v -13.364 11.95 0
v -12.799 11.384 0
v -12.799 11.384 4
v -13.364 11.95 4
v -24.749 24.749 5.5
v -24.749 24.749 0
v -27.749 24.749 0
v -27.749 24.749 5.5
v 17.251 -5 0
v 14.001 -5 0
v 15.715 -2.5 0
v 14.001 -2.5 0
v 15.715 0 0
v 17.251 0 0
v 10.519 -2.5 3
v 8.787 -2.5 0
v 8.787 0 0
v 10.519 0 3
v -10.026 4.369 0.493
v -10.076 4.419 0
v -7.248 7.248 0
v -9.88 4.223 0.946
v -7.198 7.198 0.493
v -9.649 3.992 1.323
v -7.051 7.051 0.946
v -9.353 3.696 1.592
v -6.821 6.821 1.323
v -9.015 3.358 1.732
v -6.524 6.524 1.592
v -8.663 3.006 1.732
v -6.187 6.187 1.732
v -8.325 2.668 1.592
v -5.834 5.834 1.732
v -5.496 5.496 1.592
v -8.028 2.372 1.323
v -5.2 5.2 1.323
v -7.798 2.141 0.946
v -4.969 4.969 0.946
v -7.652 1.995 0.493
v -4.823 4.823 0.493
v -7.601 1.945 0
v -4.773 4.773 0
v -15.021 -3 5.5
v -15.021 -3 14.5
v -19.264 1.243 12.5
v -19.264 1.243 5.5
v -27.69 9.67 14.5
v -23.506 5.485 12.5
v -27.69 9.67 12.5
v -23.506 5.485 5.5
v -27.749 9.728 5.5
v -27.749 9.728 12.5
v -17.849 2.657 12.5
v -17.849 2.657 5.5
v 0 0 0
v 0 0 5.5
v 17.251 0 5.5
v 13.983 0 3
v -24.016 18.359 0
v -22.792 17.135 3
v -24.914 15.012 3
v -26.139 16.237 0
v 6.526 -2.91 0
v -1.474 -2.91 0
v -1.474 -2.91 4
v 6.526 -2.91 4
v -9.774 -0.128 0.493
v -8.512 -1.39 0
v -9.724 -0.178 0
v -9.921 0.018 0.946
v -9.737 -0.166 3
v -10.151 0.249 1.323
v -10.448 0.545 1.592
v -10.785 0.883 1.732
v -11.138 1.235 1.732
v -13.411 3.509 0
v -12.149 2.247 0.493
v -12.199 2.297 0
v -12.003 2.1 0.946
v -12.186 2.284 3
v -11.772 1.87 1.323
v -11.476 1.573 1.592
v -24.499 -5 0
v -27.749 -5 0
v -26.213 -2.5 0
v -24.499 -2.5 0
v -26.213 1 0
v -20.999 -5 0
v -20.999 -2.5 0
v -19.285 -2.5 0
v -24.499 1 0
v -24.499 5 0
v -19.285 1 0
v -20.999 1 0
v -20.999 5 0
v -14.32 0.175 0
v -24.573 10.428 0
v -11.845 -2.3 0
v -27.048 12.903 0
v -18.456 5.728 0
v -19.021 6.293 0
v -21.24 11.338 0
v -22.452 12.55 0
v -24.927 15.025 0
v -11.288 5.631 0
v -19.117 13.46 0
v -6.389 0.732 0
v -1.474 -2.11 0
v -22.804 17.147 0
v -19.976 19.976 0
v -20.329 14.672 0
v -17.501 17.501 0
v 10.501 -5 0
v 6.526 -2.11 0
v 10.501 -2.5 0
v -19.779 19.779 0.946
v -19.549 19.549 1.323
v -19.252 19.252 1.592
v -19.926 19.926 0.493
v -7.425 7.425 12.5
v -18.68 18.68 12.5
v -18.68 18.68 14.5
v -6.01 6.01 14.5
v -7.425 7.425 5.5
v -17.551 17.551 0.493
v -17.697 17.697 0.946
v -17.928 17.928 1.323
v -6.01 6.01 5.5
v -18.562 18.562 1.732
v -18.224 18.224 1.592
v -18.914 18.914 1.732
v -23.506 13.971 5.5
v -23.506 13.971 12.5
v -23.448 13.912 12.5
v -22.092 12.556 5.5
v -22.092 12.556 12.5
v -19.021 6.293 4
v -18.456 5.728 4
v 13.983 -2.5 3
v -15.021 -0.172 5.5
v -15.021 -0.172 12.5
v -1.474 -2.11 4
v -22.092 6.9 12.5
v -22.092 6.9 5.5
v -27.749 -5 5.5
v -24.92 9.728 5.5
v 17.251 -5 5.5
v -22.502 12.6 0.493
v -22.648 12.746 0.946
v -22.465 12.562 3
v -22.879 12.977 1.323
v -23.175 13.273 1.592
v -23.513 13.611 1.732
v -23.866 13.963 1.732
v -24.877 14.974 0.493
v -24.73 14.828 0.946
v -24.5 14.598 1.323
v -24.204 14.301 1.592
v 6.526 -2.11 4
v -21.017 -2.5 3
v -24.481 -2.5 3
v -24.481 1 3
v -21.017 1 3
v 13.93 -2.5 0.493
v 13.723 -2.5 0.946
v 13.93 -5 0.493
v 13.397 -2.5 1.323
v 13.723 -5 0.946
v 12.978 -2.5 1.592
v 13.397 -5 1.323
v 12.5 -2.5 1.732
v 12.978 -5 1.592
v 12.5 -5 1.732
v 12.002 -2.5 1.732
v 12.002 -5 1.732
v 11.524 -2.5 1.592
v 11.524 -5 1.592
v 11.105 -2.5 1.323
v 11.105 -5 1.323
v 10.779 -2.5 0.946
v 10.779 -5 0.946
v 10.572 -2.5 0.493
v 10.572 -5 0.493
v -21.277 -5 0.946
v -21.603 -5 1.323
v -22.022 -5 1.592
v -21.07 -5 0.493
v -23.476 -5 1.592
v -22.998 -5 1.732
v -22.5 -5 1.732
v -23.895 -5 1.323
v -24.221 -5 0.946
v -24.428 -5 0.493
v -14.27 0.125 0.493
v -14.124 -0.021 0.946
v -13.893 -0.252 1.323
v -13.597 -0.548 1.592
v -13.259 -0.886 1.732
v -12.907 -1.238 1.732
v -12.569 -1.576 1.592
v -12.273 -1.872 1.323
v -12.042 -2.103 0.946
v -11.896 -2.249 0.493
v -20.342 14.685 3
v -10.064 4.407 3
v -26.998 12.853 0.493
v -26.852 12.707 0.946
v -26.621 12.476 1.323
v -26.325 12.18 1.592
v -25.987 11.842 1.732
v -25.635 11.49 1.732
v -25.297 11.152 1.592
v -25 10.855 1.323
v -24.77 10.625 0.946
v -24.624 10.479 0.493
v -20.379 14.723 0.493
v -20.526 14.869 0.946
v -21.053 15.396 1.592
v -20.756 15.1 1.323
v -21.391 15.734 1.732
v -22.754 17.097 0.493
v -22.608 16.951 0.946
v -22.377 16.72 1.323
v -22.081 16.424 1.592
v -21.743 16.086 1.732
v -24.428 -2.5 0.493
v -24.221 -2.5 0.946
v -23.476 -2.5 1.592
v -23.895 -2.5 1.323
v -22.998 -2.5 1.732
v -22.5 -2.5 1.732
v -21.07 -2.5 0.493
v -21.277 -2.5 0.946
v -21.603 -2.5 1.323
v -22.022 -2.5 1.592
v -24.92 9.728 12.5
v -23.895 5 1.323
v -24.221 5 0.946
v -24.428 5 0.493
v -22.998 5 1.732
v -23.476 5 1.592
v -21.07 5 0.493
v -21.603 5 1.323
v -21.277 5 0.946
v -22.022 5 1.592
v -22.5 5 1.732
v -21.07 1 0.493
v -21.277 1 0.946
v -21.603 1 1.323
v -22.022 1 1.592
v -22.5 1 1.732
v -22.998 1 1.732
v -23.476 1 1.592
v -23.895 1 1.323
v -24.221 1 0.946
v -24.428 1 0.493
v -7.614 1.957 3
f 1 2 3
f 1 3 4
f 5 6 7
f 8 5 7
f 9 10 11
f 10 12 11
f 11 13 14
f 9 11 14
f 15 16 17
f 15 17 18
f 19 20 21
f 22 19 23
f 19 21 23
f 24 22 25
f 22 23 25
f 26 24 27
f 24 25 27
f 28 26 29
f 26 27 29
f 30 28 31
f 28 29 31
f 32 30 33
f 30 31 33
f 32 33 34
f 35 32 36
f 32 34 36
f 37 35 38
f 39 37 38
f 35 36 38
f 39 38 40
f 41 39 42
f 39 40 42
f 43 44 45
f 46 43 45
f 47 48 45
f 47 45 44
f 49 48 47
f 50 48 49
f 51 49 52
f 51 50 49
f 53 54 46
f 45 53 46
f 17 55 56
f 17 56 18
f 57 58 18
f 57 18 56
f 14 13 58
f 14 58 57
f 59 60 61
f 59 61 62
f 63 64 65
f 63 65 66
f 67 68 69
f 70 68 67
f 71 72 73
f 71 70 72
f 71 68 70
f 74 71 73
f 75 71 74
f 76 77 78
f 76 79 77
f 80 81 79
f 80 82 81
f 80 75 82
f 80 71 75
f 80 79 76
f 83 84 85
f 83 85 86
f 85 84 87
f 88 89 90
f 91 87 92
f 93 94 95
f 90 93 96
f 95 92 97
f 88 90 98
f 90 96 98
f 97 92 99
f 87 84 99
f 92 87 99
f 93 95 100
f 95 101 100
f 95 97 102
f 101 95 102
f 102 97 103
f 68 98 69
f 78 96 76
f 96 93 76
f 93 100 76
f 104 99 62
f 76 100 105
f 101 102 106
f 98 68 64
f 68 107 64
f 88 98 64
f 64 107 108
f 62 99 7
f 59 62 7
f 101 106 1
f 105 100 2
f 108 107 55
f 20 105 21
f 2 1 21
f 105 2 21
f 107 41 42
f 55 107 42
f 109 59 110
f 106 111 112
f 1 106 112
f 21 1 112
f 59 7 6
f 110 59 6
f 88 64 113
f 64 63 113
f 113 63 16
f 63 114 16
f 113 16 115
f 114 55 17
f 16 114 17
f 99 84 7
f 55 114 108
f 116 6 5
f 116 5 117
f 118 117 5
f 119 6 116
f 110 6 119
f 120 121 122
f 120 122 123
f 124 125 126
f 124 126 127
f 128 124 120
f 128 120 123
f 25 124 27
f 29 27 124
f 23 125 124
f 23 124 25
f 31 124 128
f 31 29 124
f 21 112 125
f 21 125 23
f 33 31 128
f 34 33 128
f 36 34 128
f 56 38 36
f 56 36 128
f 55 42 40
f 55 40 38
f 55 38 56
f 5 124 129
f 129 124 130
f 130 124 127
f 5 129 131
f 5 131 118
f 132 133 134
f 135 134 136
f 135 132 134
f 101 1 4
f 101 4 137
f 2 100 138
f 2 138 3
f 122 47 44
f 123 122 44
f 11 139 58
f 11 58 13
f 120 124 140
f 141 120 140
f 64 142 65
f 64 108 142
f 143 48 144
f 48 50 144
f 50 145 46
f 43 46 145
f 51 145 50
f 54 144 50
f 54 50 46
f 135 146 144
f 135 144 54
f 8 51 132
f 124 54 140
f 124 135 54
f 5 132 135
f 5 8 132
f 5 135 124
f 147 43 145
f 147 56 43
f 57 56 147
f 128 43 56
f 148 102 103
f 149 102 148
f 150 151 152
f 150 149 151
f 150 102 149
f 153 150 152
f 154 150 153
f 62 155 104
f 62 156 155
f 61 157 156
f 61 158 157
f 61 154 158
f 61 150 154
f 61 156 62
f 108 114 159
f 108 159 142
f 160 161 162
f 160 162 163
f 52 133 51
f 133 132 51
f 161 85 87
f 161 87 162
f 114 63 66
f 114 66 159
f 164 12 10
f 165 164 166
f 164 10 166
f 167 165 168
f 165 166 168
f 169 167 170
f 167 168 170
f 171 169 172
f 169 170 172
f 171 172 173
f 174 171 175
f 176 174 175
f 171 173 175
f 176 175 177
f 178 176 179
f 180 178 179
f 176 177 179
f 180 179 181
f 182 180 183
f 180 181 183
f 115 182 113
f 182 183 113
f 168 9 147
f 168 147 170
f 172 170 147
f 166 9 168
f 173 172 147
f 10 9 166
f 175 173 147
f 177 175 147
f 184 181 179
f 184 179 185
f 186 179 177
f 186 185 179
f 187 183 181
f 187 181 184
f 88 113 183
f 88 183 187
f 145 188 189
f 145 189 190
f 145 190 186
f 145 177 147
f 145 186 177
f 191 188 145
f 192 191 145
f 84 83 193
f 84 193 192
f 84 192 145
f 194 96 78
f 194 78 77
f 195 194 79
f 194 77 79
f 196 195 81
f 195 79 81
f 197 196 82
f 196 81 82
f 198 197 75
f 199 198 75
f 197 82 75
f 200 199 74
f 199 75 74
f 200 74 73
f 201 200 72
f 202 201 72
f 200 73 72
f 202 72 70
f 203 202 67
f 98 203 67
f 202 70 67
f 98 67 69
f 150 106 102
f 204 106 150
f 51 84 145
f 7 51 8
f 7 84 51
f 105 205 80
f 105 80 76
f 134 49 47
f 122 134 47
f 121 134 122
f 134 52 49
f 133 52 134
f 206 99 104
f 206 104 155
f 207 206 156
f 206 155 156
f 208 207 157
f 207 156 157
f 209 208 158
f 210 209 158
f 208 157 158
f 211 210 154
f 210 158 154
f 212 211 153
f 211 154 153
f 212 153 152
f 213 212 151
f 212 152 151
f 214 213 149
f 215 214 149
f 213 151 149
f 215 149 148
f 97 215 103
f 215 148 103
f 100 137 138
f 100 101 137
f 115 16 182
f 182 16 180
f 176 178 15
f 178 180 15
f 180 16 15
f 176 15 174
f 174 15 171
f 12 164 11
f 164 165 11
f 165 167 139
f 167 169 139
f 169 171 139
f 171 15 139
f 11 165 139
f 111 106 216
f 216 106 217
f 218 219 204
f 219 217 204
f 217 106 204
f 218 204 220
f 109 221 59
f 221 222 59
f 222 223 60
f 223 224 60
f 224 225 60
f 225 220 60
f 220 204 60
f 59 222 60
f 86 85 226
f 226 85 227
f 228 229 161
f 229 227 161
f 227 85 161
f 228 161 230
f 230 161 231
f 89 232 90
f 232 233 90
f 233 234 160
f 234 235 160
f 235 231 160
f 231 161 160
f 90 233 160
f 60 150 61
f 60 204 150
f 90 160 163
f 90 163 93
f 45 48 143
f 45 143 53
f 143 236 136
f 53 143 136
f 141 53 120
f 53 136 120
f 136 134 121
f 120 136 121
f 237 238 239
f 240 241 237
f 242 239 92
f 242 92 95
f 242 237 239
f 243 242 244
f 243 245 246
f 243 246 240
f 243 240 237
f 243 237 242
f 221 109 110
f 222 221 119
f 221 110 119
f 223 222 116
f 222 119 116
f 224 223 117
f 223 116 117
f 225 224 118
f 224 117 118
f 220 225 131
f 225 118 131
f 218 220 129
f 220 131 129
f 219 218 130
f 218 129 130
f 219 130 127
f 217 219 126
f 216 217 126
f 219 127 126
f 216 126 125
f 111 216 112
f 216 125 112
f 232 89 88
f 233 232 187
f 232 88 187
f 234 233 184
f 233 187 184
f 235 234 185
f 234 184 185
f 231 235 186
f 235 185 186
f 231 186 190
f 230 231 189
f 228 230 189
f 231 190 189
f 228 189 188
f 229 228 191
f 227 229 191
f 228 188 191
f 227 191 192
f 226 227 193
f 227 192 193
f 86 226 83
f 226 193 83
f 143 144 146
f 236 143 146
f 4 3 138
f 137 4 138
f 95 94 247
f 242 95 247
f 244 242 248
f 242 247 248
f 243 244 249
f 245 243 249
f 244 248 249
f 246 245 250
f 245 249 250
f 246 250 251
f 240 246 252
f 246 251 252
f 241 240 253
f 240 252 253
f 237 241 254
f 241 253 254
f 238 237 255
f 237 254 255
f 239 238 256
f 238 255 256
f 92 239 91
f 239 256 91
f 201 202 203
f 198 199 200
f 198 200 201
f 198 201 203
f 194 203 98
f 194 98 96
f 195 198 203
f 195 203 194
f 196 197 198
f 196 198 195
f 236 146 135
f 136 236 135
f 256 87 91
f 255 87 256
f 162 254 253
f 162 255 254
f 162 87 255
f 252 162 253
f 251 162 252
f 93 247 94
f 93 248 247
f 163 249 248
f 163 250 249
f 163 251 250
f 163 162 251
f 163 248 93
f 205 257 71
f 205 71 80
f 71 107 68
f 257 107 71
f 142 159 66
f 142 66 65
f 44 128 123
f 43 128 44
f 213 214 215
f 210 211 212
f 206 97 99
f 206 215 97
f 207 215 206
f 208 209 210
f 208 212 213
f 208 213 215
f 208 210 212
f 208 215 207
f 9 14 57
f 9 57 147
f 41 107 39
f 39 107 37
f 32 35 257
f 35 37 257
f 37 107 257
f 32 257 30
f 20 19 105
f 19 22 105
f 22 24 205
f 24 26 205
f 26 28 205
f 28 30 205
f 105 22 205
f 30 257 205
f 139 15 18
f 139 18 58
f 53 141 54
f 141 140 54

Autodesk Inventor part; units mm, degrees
ref_plane "YZ Plane" through (0, 0, 0) normal (1, 0, 0) x (0, 1, 0)
ref_plane "XZ Plane" through (0, 0, 0) normal (0, 1, 0) x (-1, 0, 0)
ref_plane "XY Plane" through (0, 0, 0) normal (0, 0, 1) x (1, 0, 0)
sketch "Base" plane through (0, 0, 0) normal (0, 0, 1) x (1, 0, 0)
  line L0 (0, 0) -> (-24.7487, 24.7487)
  line L1 (0, 0) -> (35, 0) construction
  line L2 (-24.7487, 24.7487) -> (-24.7487, 0)
  line L3 (-24.7487, 0) -> (0, 0)
  line L4 (-24.7487, 24.7487) -> (-27.7487, 24.7487)
  line L5 (-27.7487, 24.7487) -> (-27.7487, 0)
  line L6 (-27.7487, 0) -> (-24.7487, 0)
  line L7 (-24.7487, 0) -> (-24.7487, 24.7487)
  line L8 (-27.7487, 0) -> (17.2513, 0)
  line L9 (17.2513, 0) -> (17.2513, -5)
  line L10 (17.2513, -5) -> (-27.7487, -5)
  line L11 (-27.7487, -5) -> (-27.7487, 0)
  line L12 (3, 15.0208) -> (-9.7279, 27.7487)
  line L13 (-9.7279, 27.7487) -> (-27.7487, 9.7279)
  line L14 (-27.7487, 9.7279) -> (-15.0208, -3)
  line L15 (-15.0208, -3) -> (3, 15.0208)
  line L16 (3, 15.0208) -> (-27.7487, 9.7279) construction
  line L17 (-9.7279, 27.7487) -> (-15.0208, -3) construction
  line L18 (-24.9203, 9.7279) -> (-9.7279, 24.9203)
  line L19 (-9.7279, 24.9203) -> (0.1716, 15.0208)
  line L20 (0.1716, 15.0208) -> (-15.0208, -0.1716)
  line L21 (-15.0208, -0.1716) -> (-24.9203, 9.7279)
  line L22 (-18.7383, 18.7383) -> (-17.3241, 17.3241)
  line L23 (-7.4246, 7.4246) -> (-6.0104, 6.0104)
  line L24 (-27.7487, 9.7279) -> (-23.5061, 13.9706)
  line L25 (-23.5061, 13.9706) -> (-22.0919, 12.5564)
  line L26 (-22.0919, 12.5564) -> (-26.3345, 8.3137)
  line L27 (-26.3345, 8.3137) -> (-27.7487, 9.7279)
  line L28 (-23.5061, 5.4853) -> (-19.2635, 1.2426)
  line L29 (-16.435, 4.0711) -> (-23.5061, 5.4853) construction
  line L30 (-20.6777, 8.3137) -> (-19.2635, 1.2426) construction
  line L31 (-6.0104, 6.0104) -> (-7.4246, 7.4246)
  line L32 (-7.4246, 7.4246) -> (-16.435, -1.5858)
  line L33 (-16.435, -1.5858) -> (-15.0208, -3)
  line L34 (-15.0208, -3) -> (-6.0104, 6.0104)
  line L35 (-15.0208, -0.1716) -> (-17.8492, 2.6569)
  line L36 (-17.8492, 2.6569) -> (-19.2635, 1.2426)
  line L37 (-19.2635, 1.2426) -> (-16.435, -1.5858)
  line L38 (-16.435, -1.5858) -> (-15.0208, -0.1716)
  line L39 (-26.3345, 8.3137) -> (-23.5061, 5.4853)
  line L40 (-23.5061, 5.4853) -> (-22.0919, 6.8995)
  line L41 (-22.0919, 6.8995) -> (-24.9203, 9.7279)
  line L42 (-24.9203, 9.7279) -> (-26.3345, 8.3137)
  point P0 (-12.3744, 12.3744)
  point P1 (-19.9706, 4.7782)
  dimension "d0" = 35
  dimension "d1" = 135
  dimension "d2" = 3
  dimension "d3" = 45
  dimension "d4" = 5
  dimension "d5" = 18
  dimension "d6" = 2
  dimension "d7" = 6
extrude "Extrusion1" add sketch "Base" along normal blind 5.5 contours L3 L15 L0 | L8 L9 L10 L11 L6 L3 L14 L15 | L15 L3 L20 L0 | L15 L14 L32 L20 L3 | L20 L3 L21 L2 L18 L0 | L20 L21 L3 | L18 L25 L13 L0 | L21 L32 L14 L3 | L3 L14 L36 L21 | L13 L2 L0 | L18 L2 L13 L25 | L3 L2 L14 | L36 L14 L40 L21 | L5 L14 L2 L6 | L2 L13 L5 L4 | L18 L26 L14 L13 L2 | L2 L21 L18 | L40 L14 L2 L21 | L2 L14 L26 L21
extrude "Extrusion2" add sketch "Base" along normal blind 12.5 contours L15 L3 L20 L0 | L15 L14 L32 L20 L3 | L21 L32 L14 L3 | L3 L14 L36 L21 | L18 L2 L13 L25 | L18 L26 L14 L13 L2 | L40 L14 L2 L21 | L2 L14 L26 L21
sketch "TouchProtection" plane through (0, 0, 12.5) normal (0, 0, 1) x (1, 0, 0)
  line L0 (-6.0104, 6.0104) -> (-15.0208, -3) projected
  line L1 (-6.0104, 6.0104) -> (-15.0208, -3)
  line L2 (-15.0208, -3) -> (-27.6905, 9.6697)
  line L3 (-27.6905, 9.6697) -> (-18.6801, 18.6801)
  line L4 (-18.6801, 18.6801) -> (-6.0104, 6.0104)
  point P0 (0, 0)
extrude "Extrusion3" add sketch "TouchProtection" along normal blind 2
sketch "MountingHolesBottom" plane through (-27.7487, -5, 0) normal (0, -1, 0) x (1, 0, 0)
  line L0 (0, 0) -> (5, 0)
  line L1 (45, 0) -> (40, 0)
  circle A0 centre (5, 0) radius 1.75
  circle A1 centre (40, 0) radius 1.75
  line L2 (5, 0) -> (5, 3)
  line L3 (5, 0) -> (8, 0) construction
  line L4 (6.7321, 3) -> (8.4641, 0)
  line L5 (8.4641, 0) -> (6.7321, -3)
  line L6 (6.7321, -3) -> (3.2679, -3)
  line L7 (3.2679, -3) -> (1.5359, 0)
  line L8 (1.5359, 0) -> (3.2679, 3)
  line L9 (3.2679, 3) -> (6.7321, 3)
  line L10 (40, 0) -> (40, 3)
  line L11 (41.7321, 3) -> (43.4641, 0)
  line L12 (43.4641, 0) -> (41.7321, -3)
  line L13 (41.7321, -3) -> (38.2679, -3)
  line L14 (38.2679, -3) -> (36.5359, 0)
  line L15 (36.5359, 0) -> (38.2679, 3)
  line L16 (38.2679, 3) -> (41.7321, 3)
  line L17 (1.5359, 0) -> (43.4641, 0)
  point P0 (27.7487, 0)
  dimension "d15" = 5
  dimension "d16" = 5
  dimension "d17" = 3.5
  dimension "d18" = 3.5
  dimension "d19" = 3
  dimension "d20" = 90
  dimension "d21" = 3
extrude "Extrusion4" cut sketch "MountingHolesBottom" against normal blind 10 contours A0 L2 L0 | L0 L17 A0 | L2 A0 L17 | L17 L1 A1 | A1 L10 L17 | A1 L1 L10
extrude "Extrusion5" cut sketch "MountingHolesBottom" against normal blind 6 contours L8 L9 L2 A0 L0 | L0 A0 L17 L5 L6 L7 | L15 L16 L10 A1 L17 | L17 A1 L1 L12 L13 L14 | L2 L9 L4 L17 A0 | L16 L11 L1 A1 L10
extrude "Extrusion6" add sketch "MountingHolesBottom" against normal blind 2.5 contours L8 L9 L2 A0 L0 | L0 A0 L17 L5 L6 L7 | L15 L16 L10 A1 L17 | L17 A1 L1 L12 L13 L14 | L2 L9 L4 L17 A0 | L16 L11 L1 A1 L10
sketch "MountingHolesE27" plane through (0, 0, 0) normal (0.7071, 0.7071, 0) x (-0.7071, 0.7071, 0)
  line L0 (0, 0) -> (0, 5.5) projected
  line L1 (0, 0) -> (8.5, 0)
  line L2 (0, 0) -> (35, 0) projected
  line L3 (8.5, 0) -> (26.5, 0)
  circle A0 centre (8.5, 0) radius 1.75
  circle A1 centre (26.5, 0) radius 1.75
  line L4 (8.5, 0) -> (8.5, 3)
  line L5 (26.5, 0) -> (26.5, 3)
  line L6 (26.5, 0) -> (29.5, 0) construction
  line L7 (28.2321, 3) -> (29.9641, 0)
  line L8 (29.9641, 0) -> (28.2321, -3)
  line L9 (28.2321, -3) -> (24.7679, -3)
  line L10 (24.7679, -3) -> (23.0359, 0)
  line L11 (23.0359, 0) -> (24.7679, 3)
  line L12 (24.7679, 3) -> (28.2321, 3)
  line L13 (10.2321, 3) -> (11.9641, 0)
  line L14 (11.9641, 0) -> (10.2321, -3)
  line L15 (10.2321, -3) -> (6.7679, -3)
  line L16 (6.7679, -3) -> (5.0359, 0)
  line L17 (5.0359, 0) -> (6.7679, 3)
  line L18 (6.7679, 3) -> (10.2321, 3)
  dimension "d30" = 8.5
  dimension "d31" = 18
  dimension "d32" = 180
  dimension "d33" = 3.5
  dimension "d34" = 3.5
  dimension "d35" = 3
  dimension "d36" = 3
  dimension "d37" = 90
extrude "Extrusion8" cut sketch "MountingHolesE27" against normal blind 10 contours A0 L4 L1 | L1 L2 A0 | L4 A0 L2 | A1 L5 L2 | L2 A1 | L5 A1 L2
extrude "Extrusion9" cut sketch "MountingHolesE27" against normal blind 7 contours L17 L18 L4 A0 L1 | L1 A0 L2 L14 L15 L16 | L11 L12 L5 A1 L2 | L2 A1 L8 L9 L10 | L4 L18 L13 L2 A0 | L5 L12 L7 L2 A1
extrude "Extrusion10" add sketch "MountingHolesE27" against normal blind 4 contours L17 L18 L4 A0 L1 | L1 A0 L2 L14 L15 L16 | L11 L12 L5 A1 L2 | L2 A1 L8 L9 L10 | L4 L18 L13 L2 A0 | L5 L12 L7 L2 A1
sketch "Sketch7" plane through (0, 0, 0) normal (0, 0, -1) x (-1, 0, 0)
  line L0 (-17.2513, -5) -> (-17.2513, 0) projected
  line L1 (24.7487, 24.7487) -> (27.7487, 24.7487) projected
  line L2 (-17.2513, -5) -> (27.7487, -5)
  line L3 (27.7487, -5) -> (27.7487, 24.7487)
  line L4 (27.7487, 24.7487) -> (-17.2513, 24.7487)
  line L5 (-17.2513, 24.7487) -> (-17.2513, -5)
  point P0 (0, 0)
extrude "Extrusion11" cut sketch "Sketch7" along normal blind 21.25
sketch "Sketch8" plane through (0, 0, 0) normal (0, 0, -1) x (-1, 0, 0)
  line L0 (7.2478, 7.2478) -> (17.5009, 17.5009) projected
  line L1 (12.3744, 12.3744) -> (13.0815, 11.6673)
  line L2 (12.3744, 12.3744) -> (13.3744, 12.3744) construction
  line L3 (13.0815, 11.6673) -> (15.9099, 8.8388)
  line L4 (18.4555, 5.7276) -> (12.7986, 11.3844)
  line L5 (12.7986, 11.3844) -> (13.3643, 11.9501)
  line L6 (13.3643, 11.9501) -> (19.0212, 6.2933)
  line L7 (19.0212, 6.2933) -> (18.4555, 5.7276)
  line L8 (18.4555, 5.7276) -> (13.3643, 11.9501) construction
  line L9 (12.7986, 11.3844) -> (19.0212, 6.2933) construction
  line L10 (-10.5258, -5.0105) -> (-2.5258, -5.0105)
  line L11 (20.9987, -5) -> (-10.5013, -5) projected
  line L12 (-10.5258, -5.0105) -> (-2.5258, -5.0105) construction
  line L13 (-2.5258, -5.0105) -> (-2.5258, -2.5105)
  line L14 (-6.5258, -2.1105) -> (1.4742, -2.1105)
  line L15 (1.4742, -2.1105) -> (1.4742, -2.9105)
  line L16 (1.4742, -2.9105) -> (-6.5258, -2.9105)
  line L17 (-6.5258, -2.9105) -> (-6.5258, -2.1105)
  line L18 (-6.5258, -2.1105) -> (1.4742, -2.9105) construction
  line L19 (1.4742, -2.1105) -> (-6.5258, -2.9105) construction
  point P0 (0, 0)
  dimension "d46" = 1
  dimension "d47" = 45
  dimension "d48" = 4
  dimension "d49" = 0.8
  dimension "d50" = 8
  dimension "d51" = 0
  dimension "d52" = 2.5
  dimension "d53" = 8
  dimension "d54" = 0.8
extrude "Extrusion12" cut sketch "Sketch8" against normal blind 4
properties part number "e27_Holder_v2"
